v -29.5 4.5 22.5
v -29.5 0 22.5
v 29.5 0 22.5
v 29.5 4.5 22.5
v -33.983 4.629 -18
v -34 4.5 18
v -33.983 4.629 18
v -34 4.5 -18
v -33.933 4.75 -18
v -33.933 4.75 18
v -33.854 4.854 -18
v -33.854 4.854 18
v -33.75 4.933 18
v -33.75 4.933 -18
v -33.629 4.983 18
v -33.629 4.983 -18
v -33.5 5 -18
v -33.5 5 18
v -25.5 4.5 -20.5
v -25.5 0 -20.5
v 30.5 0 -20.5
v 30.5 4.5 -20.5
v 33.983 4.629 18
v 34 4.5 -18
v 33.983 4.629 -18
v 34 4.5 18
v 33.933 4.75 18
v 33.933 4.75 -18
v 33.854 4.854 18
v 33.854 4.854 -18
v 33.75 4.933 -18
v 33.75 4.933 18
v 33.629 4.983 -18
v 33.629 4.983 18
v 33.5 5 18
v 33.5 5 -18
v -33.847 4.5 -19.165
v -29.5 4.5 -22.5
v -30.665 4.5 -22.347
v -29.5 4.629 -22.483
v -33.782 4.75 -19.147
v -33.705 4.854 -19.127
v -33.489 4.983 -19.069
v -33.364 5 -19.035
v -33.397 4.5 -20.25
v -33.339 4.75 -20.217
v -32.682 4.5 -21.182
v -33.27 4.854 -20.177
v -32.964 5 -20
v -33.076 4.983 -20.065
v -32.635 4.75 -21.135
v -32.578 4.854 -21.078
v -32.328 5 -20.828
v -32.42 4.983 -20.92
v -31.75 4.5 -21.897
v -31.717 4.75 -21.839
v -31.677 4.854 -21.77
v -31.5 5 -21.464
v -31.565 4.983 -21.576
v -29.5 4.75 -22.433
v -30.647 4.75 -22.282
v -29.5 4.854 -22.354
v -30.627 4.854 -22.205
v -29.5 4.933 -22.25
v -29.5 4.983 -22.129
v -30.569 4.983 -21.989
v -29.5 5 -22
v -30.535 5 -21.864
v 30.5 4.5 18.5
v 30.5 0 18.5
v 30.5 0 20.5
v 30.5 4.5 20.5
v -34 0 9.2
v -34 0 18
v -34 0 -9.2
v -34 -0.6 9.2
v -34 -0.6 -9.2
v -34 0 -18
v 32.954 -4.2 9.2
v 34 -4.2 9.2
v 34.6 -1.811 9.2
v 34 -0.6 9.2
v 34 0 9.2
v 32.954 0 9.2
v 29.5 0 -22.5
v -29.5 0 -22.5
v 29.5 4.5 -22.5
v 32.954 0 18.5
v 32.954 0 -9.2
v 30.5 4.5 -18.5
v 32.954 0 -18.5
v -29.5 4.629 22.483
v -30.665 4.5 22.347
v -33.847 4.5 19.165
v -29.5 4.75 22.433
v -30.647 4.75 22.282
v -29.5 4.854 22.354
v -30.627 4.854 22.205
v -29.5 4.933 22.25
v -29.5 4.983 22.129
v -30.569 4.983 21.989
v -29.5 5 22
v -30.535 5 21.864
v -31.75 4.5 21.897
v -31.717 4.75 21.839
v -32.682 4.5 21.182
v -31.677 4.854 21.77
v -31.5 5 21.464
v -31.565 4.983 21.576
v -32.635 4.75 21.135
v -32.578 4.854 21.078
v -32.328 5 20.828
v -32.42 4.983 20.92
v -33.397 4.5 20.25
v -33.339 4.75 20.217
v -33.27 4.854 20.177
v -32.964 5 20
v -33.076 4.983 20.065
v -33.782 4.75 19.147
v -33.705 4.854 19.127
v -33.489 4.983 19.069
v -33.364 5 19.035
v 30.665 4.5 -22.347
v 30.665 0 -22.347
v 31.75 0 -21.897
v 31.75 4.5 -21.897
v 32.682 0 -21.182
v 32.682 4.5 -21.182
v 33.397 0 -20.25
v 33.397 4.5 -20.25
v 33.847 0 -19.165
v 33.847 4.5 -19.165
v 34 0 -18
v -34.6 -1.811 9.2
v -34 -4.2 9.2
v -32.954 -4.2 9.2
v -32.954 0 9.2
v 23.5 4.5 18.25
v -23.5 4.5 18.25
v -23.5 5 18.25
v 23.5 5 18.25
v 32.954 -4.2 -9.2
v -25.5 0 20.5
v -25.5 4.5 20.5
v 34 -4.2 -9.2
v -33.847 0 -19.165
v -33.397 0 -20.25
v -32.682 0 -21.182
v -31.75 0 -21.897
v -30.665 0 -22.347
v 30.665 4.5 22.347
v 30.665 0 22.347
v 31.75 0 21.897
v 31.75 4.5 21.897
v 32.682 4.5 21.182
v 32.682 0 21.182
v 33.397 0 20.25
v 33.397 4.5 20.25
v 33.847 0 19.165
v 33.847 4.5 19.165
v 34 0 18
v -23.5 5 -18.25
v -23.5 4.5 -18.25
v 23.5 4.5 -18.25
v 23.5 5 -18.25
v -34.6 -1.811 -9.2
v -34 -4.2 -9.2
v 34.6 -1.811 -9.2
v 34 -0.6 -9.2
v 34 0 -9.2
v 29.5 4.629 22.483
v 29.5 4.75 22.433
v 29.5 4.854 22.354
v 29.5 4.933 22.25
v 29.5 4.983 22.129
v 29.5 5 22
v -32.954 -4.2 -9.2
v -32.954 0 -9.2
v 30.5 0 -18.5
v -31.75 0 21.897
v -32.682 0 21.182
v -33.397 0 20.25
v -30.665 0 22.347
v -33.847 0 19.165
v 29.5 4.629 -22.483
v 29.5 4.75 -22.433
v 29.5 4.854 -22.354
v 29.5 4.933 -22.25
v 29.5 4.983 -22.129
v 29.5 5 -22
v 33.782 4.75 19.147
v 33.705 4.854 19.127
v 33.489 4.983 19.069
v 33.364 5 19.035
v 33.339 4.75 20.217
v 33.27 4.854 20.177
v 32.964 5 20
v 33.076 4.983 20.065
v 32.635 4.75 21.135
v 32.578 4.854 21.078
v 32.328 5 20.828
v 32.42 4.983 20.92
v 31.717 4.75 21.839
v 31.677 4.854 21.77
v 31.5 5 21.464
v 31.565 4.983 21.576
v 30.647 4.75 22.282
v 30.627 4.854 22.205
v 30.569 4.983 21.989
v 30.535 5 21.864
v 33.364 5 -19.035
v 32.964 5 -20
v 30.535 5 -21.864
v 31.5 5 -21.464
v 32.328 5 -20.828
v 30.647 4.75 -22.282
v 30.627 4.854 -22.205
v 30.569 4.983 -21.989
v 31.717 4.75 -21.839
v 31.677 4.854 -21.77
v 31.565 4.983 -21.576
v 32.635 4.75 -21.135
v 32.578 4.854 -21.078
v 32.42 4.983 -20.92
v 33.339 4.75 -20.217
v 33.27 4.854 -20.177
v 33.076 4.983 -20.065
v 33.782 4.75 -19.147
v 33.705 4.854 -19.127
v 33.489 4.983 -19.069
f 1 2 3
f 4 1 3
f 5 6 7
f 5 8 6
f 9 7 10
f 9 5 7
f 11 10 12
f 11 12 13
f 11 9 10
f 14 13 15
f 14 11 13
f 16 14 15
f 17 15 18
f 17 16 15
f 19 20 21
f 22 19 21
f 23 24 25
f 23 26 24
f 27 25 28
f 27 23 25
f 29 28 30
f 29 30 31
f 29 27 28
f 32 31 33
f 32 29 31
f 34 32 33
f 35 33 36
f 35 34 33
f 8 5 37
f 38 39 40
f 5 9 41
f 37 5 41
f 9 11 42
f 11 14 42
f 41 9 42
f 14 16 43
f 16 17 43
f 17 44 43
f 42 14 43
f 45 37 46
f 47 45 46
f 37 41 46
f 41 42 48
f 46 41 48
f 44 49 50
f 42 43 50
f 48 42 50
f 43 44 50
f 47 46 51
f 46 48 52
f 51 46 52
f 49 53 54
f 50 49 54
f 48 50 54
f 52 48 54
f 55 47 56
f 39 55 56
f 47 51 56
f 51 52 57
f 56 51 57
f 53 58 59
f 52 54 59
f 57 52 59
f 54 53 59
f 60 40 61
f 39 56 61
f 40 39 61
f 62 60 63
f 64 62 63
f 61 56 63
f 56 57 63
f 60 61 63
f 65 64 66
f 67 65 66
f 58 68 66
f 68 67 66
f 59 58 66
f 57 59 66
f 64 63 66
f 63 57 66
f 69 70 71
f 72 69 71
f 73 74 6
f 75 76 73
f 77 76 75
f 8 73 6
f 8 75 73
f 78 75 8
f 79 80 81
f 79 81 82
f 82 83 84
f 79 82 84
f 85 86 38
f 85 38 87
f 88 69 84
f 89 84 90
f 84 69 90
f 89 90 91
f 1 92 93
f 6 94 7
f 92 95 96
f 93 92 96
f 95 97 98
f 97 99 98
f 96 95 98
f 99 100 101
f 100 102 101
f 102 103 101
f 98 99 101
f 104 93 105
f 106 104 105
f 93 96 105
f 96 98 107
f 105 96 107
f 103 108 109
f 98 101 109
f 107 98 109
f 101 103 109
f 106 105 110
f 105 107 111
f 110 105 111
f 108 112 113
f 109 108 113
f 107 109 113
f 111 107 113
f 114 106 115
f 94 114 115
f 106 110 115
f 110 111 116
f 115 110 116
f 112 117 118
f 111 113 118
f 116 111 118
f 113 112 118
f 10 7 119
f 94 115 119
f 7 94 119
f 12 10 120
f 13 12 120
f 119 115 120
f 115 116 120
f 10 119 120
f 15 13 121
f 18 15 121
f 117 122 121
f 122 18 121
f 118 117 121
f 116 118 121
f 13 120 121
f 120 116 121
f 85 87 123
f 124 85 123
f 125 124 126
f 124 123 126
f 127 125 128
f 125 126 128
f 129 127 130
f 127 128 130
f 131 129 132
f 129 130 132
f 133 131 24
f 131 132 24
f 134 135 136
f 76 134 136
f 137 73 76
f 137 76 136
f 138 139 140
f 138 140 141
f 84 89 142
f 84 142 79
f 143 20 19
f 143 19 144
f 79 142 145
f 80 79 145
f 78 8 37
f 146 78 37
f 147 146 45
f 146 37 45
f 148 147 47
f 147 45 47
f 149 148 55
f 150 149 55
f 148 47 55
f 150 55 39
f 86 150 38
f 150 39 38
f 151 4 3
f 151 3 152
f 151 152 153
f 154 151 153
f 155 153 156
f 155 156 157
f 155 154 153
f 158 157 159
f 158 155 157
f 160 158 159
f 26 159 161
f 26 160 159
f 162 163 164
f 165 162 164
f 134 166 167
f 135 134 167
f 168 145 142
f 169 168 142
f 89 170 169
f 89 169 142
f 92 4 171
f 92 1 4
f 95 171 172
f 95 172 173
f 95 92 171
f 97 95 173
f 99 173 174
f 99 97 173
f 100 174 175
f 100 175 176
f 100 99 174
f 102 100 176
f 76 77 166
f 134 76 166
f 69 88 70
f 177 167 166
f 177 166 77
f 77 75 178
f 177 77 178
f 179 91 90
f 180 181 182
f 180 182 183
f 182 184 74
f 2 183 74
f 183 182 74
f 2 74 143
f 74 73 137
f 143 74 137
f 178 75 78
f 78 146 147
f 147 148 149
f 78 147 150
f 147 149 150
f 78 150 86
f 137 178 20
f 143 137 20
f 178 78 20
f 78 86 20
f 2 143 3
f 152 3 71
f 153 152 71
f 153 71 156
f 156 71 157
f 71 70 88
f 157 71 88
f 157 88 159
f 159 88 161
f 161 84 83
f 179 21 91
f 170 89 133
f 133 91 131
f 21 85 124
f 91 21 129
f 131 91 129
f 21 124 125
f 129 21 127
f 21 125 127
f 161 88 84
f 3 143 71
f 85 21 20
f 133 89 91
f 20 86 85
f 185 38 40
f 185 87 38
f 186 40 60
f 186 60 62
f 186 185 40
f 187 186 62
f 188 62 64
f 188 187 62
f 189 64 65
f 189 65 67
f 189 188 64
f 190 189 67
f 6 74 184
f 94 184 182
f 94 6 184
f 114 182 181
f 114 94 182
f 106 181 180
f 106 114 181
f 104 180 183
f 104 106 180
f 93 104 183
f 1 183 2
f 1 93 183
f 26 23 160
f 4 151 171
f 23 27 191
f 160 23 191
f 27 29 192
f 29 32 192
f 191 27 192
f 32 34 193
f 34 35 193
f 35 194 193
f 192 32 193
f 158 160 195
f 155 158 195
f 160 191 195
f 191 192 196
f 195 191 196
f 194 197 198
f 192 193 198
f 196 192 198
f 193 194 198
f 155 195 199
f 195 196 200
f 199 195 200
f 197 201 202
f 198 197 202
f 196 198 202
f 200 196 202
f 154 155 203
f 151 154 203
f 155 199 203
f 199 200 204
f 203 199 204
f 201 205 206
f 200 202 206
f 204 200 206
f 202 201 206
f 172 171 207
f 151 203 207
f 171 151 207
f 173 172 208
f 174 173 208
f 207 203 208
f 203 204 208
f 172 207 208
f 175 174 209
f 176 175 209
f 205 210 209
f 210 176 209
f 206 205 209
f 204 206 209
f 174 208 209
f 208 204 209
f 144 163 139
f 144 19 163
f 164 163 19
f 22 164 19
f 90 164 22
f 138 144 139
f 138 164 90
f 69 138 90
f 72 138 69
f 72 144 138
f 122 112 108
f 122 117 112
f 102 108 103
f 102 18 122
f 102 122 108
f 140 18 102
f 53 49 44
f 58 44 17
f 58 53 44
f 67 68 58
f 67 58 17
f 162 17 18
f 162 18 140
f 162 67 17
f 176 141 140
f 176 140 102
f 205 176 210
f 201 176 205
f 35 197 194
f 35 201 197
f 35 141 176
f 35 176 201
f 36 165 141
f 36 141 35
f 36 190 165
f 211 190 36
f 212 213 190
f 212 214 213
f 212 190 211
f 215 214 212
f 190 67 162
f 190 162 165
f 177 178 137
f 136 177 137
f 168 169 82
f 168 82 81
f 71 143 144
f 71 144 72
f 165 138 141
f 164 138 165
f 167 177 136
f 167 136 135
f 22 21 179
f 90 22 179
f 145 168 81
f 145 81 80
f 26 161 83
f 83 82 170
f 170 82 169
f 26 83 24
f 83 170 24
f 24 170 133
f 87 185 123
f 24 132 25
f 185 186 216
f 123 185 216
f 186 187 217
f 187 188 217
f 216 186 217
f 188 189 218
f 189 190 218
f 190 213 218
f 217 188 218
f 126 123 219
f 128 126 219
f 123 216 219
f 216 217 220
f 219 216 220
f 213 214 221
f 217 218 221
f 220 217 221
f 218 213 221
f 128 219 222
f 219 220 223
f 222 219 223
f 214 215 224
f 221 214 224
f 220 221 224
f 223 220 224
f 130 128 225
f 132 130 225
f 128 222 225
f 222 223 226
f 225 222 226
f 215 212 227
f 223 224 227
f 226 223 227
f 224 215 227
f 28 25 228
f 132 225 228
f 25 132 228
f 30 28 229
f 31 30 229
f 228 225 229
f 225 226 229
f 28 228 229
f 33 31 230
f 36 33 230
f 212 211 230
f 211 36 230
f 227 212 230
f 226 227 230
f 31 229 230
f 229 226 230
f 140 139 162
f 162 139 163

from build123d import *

# Parameters (mm, degrees)
SKETCH1_W               = 68
SKETCH1_H               = 45
SKETCH1_W_2             = 47
SKETCH1_H_2             = 36.5
BOSS_EXTRUDE1_DEPTH     = 5
SKETCH2_W               = 56
SKETCH2_H               = 41
CUT_EXTRUDE1_DEPTH      = 4.5
CUT_EXTRUDE2_DEPTH      = 18.5
CUT_EXTRUDE2_DEPTH_BACK = 18.5
FILLET1_R               = 4.5
FILLET2_R               = 0.5
SKETCH4_W               = 1.046214581
SKETCH4_H               = 18.4
BOSS_EXTRUDE2_DEPTH     = 4.2
BOSS_EXTRUDE3_DEPTH     = 18.4


with BuildPart() as part:
    # Sketch1 → Boss-Extrude1 (new body)
    with BuildSketch(Plane(origin=(0, 0, 0), x_dir=(1, 0, 0), z_dir=(0, 1, 0))):
        Rectangle(SKETCH1_W, SKETCH1_H)
        Rectangle(SKETCH1_W_2, SKETCH1_H_2, mode=Mode.SUBTRACT)
    extrude(amount=BOSS_EXTRUDE1_DEPTH)

    # Sketch2 → Cut-Extrude1 (cut)
    with BuildSketch(Plane.XZ):
        with Locations((2.5, 0)):
            Rectangle(SKETCH2_W, SKETCH2_H)
    extrude(amount=-CUT_EXTRUDE1_DEPTH, mode=Mode.SUBTRACT)

    # Sketch3 → Cut-Extrude2 (cut, two sides: drawn at the far end of the back side and taken through both)
    with BuildSketch(Plane.XY.offset(-CUT_EXTRUDE2_DEPTH_BACK)):
        Polygon((30.5, 4.5), (32.953785419, 0), (30.5, 0), align=None)
    extrude(amount=CUT_EXTRUDE2_DEPTH + CUT_EXTRUDE2_DEPTH_BACK, mode=Mode.SUBTRACT)

    # Fillet1
    fillet1_edges = [part.edges().sort_by_distance(p)[0] for p in [
        (-34, 2.5, -22.5),
        (34, 2.5, -22.5),
        (34, 2.5, 22.5),
        (-34, 2.5, 22.5),
    ]]
    fillet(fillet1_edges, radius=FILLET1_R)

    # Fillet2
    fillet2_edges = [part.edges().sort_by_distance(p)[0] for p in [
        (-34, 5, 0),
        (0, 5, -22.5),
        (0, 5, 22.5),
        (34, 5, 0),
        (32.681980515, 5, 21.181980515),
        (32.681980515, 5, -21.181980515),
        (-32.681980515, 5, 21.181980515),
        (-32.681980515, 5, -21.181980515),
    ]]
    fillet(fillet2_edges, radius=FILLET2_R)

    # Sketch4 → Boss-Extrude2 (add)
    with BuildSketch(Plane.XZ):
        with Locations((33.476892709, 0)):
            Rectangle(SKETCH4_W, SKETCH4_H)
    boss_extrude2 = extrude(amount=BOSS_EXTRUDE2_DEPTH)

    # Sketch5 → Boss-Extrude3 (add)
    with BuildSketch(Plane(origin=(0, 0, -9.2), x_dir=(-1, 0, 0), z_dir=(0, 0, -1))):
        Polygon((-34, -0.6), (-34.6, -1.811446), (-34, -4.2), align=None)
    boss_extrude3 = extrude(amount=-BOSS_EXTRUDE3_DEPTH)

    # Mirror1: Boss-Extrude2, Boss-Extrude3 across plane
    add(boss_extrude2.mirror(Plane(origin=(0, 0, 0), x_dir=(0, 0, 1), z_dir=(1, 0, 0))))
    add(boss_extrude3.mirror(Plane(origin=(0, 0, 0), x_dir=(0, 0, 1), z_dir=(1, 0, 0))))


solid = part.part
